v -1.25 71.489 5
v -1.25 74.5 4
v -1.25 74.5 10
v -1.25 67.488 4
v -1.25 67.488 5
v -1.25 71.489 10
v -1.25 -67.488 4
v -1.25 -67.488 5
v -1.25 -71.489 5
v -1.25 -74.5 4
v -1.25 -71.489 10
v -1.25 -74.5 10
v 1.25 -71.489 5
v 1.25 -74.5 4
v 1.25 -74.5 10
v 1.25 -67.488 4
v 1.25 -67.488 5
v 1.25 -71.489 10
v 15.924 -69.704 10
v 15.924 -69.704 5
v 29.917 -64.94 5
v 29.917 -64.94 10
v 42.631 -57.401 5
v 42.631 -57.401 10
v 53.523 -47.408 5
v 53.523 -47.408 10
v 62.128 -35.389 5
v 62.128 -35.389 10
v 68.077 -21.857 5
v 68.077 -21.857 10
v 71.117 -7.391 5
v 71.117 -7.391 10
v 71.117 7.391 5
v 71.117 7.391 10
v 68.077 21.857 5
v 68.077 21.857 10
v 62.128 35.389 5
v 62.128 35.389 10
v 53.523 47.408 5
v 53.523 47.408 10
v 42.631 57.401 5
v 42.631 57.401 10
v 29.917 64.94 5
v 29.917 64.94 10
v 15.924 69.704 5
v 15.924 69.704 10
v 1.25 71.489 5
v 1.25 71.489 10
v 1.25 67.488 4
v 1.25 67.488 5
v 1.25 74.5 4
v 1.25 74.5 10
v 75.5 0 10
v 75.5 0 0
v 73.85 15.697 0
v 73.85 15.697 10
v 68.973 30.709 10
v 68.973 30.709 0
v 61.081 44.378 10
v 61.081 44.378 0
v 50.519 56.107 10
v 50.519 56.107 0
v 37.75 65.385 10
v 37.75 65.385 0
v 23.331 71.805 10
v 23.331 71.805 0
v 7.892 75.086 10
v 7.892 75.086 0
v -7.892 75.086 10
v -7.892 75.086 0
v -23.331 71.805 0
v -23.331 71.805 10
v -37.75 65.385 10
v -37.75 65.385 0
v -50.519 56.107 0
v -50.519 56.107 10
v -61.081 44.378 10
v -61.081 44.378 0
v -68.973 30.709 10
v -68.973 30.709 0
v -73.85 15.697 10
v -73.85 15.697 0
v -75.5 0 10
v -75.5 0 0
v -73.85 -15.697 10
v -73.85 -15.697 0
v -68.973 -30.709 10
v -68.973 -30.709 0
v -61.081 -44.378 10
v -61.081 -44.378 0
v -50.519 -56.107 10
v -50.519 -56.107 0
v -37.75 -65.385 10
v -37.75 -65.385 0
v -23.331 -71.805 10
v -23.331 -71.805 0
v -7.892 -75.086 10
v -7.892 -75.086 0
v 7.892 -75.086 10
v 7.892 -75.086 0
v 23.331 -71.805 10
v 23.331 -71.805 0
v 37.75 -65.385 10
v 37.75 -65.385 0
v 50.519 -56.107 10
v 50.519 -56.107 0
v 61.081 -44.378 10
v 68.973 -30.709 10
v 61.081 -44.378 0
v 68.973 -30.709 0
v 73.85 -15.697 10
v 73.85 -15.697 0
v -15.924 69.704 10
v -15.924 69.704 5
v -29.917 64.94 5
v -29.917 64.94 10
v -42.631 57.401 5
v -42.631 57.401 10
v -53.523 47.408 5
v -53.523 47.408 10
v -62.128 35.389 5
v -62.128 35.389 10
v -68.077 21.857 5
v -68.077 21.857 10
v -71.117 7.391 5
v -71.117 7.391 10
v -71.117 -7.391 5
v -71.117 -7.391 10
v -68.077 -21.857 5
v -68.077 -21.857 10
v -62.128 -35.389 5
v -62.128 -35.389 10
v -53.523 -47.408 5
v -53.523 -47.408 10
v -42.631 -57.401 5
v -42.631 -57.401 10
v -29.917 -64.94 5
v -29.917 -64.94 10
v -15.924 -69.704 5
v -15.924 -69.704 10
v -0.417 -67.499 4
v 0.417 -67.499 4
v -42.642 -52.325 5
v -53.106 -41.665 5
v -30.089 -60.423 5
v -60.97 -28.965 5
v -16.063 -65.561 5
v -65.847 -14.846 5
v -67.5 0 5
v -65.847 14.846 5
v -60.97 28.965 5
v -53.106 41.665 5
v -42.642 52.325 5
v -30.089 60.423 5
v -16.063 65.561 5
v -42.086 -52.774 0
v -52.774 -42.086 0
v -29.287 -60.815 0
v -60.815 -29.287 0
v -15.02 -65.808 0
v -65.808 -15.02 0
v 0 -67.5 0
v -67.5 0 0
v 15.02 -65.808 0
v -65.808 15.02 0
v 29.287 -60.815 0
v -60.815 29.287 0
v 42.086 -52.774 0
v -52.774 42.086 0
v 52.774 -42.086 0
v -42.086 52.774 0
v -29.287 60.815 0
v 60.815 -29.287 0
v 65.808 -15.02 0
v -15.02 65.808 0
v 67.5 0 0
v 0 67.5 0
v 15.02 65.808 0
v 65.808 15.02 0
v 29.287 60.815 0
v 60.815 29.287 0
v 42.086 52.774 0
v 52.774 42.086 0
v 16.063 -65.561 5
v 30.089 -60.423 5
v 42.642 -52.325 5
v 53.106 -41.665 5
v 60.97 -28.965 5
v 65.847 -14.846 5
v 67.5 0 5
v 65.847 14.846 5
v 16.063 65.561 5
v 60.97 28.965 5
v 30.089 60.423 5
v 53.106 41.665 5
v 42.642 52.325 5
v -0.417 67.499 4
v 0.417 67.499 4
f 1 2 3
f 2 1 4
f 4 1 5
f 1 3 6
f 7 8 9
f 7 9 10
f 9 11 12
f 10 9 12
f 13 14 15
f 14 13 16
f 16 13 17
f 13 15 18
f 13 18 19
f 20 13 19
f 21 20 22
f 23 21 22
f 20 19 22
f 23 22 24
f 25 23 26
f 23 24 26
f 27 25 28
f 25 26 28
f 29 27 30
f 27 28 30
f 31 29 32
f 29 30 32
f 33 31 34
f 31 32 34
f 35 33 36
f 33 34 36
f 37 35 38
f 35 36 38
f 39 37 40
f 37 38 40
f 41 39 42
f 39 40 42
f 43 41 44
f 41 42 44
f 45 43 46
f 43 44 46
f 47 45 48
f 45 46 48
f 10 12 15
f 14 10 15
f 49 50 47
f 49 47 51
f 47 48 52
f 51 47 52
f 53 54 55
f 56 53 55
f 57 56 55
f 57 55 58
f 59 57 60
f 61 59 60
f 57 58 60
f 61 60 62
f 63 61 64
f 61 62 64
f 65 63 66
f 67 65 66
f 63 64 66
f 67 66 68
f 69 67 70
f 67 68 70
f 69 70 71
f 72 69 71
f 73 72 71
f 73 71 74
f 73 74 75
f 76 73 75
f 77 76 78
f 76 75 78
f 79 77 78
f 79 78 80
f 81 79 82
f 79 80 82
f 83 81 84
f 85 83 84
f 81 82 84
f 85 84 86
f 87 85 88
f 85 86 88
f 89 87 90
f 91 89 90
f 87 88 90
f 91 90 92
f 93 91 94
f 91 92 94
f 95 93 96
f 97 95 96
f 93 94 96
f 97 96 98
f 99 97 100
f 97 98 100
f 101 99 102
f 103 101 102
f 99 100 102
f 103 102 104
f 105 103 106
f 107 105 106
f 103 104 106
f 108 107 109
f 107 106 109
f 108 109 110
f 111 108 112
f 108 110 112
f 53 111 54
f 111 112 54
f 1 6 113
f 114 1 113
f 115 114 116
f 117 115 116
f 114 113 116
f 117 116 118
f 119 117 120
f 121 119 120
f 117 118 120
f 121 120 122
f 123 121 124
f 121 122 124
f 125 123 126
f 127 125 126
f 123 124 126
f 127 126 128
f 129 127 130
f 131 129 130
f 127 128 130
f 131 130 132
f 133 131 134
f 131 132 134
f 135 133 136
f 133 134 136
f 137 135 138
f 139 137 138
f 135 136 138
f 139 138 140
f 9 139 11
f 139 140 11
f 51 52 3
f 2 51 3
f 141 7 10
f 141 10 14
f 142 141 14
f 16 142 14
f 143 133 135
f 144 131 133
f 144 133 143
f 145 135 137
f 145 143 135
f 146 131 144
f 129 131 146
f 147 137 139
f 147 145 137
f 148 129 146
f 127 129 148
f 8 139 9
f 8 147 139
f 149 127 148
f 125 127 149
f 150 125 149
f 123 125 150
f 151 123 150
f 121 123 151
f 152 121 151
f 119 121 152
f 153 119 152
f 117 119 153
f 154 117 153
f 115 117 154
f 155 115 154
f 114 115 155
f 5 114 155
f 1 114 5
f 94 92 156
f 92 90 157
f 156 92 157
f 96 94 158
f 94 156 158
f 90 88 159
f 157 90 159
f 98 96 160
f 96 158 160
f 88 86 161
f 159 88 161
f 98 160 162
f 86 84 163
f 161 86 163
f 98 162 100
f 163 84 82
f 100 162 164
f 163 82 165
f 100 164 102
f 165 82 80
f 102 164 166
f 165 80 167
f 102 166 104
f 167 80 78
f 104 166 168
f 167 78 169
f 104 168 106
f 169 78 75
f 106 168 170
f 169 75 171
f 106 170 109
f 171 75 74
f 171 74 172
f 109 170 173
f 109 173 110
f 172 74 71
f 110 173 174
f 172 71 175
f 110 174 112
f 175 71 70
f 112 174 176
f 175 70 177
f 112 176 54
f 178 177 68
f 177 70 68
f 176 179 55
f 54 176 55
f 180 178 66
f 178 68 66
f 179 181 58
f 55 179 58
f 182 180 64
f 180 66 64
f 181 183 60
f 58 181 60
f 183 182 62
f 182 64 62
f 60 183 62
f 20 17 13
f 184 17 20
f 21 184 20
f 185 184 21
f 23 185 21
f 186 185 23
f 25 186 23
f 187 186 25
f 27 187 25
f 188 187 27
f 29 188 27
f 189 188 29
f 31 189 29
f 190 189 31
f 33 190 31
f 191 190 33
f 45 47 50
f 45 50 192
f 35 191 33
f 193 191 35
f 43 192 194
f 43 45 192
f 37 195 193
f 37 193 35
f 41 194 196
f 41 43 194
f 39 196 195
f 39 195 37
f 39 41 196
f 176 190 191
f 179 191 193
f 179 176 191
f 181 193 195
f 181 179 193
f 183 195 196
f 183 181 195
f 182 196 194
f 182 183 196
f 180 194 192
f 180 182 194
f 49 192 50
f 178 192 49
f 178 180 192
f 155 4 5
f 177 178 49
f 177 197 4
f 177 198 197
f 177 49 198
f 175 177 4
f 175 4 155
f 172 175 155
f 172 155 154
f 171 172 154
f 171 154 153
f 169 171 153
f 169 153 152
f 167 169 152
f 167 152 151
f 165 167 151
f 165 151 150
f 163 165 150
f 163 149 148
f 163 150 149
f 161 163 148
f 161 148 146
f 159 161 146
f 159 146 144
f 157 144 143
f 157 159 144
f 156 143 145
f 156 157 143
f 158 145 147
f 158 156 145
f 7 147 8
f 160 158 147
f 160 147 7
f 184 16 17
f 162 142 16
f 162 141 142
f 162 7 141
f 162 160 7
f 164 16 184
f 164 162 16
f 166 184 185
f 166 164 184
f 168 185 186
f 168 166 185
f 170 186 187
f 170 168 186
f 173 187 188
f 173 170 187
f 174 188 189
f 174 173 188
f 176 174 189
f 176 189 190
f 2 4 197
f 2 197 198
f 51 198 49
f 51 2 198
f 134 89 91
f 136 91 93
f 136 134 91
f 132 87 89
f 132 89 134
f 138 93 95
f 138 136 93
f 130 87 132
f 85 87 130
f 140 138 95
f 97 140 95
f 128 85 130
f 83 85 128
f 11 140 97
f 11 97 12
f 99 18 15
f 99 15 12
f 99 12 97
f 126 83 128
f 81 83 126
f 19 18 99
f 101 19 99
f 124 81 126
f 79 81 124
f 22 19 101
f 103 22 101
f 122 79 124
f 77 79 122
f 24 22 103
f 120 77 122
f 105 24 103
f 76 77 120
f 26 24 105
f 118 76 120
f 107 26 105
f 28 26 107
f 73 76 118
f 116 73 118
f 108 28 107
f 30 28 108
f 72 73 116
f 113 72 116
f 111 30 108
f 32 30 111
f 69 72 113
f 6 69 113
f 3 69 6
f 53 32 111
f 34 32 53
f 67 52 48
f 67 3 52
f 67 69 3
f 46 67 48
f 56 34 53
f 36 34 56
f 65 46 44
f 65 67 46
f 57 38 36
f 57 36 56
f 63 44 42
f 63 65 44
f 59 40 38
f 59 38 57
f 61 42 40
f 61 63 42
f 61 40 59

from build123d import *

# Parameters (mm, degrees)
F0_R     = 75.5
F0_R_2   = 67.5
F1_DEPTH = 10
F3_DEPTH = 6
F4_DEPTH = 5


with BuildPart() as f1:
    # F0 (on Top) → F1 (new body)
    with BuildSketch(Plane.XY):
        Circle(F0_R)
        Circle(F0_R_2, mode=Mode.SUBTRACT)
    extrude(amount=F1_DEPTH)

    # F2 (on face) → F3 (cut)
    with BuildSketch(Plane.XY.offset(10)):
        with BuildLine():
            Line((1.25, 71.4890725916), (1.25, 74.5))
            Line((1.25, 74.5), (-1.25, 74.5))
            Line((-1.25, 74.5), (-1.25, 71.4890725916))
            ThreePointArc((-1.25, 71.4890725916), (0, 71.5), (1.25, 71.4890725916))
        make_face()
        with BuildLine():
            Line((1.25, 67.4884249335), (1.25, 71.4890725916))
            ThreePointArc((1.25, 71.4890725916), (0, 71.5), (-1.25, 71.4890725916))
            Line((-1.25, 71.4890725916), (-1.25, 67.4884249335))
            ThreePointArc((-1.25, 67.4884249335), (0, 67.5), (1.25, 67.4884249335))
        make_face()
        with BuildLine():
            Line((-1.25, -67.4884249335), (-1.25, -71.4890725916))
            ThreePointArc((-1.25, -71.4890725916), (0, -71.5), (1.25, -71.4890725916))
            Line((1.25, -71.4890725916), (1.25, -67.4884249335))
            ThreePointArc((1.25, -67.4884249335), (0, -67.5), (-1.25, -67.4884249335))
        make_face()
        with BuildLine():
            ThreePointArc((1.25, -71.4890725916), (0, -71.5), (-1.25, -71.4890725916))
            Line((-1.25, -71.4890725916), (-1.25, -74.5))
            Line((-1.25, -74.5), (1.25, -74.5))
            Line((1.25, -74.5), (1.25, -71.4890725916))
        make_face()
    extrude(amount=-F3_DEPTH, mode=Mode.SUBTRACT)

    # F2 (on face) → F4 (cut)
    with BuildSketch(Plane.XY.offset(10)):
        with BuildLine():
            ThreePointArc((71.5, 0), (50.9981617316, 50.114244482), (1.25, 71.4890725916))
            Line((1.25, 71.4890725916), (1.25, 67.4884249335))
            ThreePointArc((1.25, 67.4884249335), (48.16962217, 47.2857007984), (67.5, 0))
            ThreePointArc((67.5, 0), (48.16962217, -47.2857007984), (1.25, -67.4884249335))
            Line((1.25, -67.4884249335), (1.25, -71.4890725916))
            ThreePointArc((1.25, -71.4890725916), (50.9981617316, -50.114244482), (71.5, 0))
        make_face()
        with BuildLine():
            Line((-1.25, 67.4884249335), (-1.25, 71.4890725916))
            ThreePointArc((-1.25, 71.4890725916), (-71.5, 0), (-1.25, -71.4890725916))
            Line((-1.25, -71.4890725916), (-1.25, -67.4884249335))
            ThreePointArc((-1.25, -67.4884249335), (-67.5, 0), (-1.25, 67.4884249335))
        make_face()
    extrude(amount=-F4_DEPTH, mode=Mode.SUBTRACT)


solid = f1.part
